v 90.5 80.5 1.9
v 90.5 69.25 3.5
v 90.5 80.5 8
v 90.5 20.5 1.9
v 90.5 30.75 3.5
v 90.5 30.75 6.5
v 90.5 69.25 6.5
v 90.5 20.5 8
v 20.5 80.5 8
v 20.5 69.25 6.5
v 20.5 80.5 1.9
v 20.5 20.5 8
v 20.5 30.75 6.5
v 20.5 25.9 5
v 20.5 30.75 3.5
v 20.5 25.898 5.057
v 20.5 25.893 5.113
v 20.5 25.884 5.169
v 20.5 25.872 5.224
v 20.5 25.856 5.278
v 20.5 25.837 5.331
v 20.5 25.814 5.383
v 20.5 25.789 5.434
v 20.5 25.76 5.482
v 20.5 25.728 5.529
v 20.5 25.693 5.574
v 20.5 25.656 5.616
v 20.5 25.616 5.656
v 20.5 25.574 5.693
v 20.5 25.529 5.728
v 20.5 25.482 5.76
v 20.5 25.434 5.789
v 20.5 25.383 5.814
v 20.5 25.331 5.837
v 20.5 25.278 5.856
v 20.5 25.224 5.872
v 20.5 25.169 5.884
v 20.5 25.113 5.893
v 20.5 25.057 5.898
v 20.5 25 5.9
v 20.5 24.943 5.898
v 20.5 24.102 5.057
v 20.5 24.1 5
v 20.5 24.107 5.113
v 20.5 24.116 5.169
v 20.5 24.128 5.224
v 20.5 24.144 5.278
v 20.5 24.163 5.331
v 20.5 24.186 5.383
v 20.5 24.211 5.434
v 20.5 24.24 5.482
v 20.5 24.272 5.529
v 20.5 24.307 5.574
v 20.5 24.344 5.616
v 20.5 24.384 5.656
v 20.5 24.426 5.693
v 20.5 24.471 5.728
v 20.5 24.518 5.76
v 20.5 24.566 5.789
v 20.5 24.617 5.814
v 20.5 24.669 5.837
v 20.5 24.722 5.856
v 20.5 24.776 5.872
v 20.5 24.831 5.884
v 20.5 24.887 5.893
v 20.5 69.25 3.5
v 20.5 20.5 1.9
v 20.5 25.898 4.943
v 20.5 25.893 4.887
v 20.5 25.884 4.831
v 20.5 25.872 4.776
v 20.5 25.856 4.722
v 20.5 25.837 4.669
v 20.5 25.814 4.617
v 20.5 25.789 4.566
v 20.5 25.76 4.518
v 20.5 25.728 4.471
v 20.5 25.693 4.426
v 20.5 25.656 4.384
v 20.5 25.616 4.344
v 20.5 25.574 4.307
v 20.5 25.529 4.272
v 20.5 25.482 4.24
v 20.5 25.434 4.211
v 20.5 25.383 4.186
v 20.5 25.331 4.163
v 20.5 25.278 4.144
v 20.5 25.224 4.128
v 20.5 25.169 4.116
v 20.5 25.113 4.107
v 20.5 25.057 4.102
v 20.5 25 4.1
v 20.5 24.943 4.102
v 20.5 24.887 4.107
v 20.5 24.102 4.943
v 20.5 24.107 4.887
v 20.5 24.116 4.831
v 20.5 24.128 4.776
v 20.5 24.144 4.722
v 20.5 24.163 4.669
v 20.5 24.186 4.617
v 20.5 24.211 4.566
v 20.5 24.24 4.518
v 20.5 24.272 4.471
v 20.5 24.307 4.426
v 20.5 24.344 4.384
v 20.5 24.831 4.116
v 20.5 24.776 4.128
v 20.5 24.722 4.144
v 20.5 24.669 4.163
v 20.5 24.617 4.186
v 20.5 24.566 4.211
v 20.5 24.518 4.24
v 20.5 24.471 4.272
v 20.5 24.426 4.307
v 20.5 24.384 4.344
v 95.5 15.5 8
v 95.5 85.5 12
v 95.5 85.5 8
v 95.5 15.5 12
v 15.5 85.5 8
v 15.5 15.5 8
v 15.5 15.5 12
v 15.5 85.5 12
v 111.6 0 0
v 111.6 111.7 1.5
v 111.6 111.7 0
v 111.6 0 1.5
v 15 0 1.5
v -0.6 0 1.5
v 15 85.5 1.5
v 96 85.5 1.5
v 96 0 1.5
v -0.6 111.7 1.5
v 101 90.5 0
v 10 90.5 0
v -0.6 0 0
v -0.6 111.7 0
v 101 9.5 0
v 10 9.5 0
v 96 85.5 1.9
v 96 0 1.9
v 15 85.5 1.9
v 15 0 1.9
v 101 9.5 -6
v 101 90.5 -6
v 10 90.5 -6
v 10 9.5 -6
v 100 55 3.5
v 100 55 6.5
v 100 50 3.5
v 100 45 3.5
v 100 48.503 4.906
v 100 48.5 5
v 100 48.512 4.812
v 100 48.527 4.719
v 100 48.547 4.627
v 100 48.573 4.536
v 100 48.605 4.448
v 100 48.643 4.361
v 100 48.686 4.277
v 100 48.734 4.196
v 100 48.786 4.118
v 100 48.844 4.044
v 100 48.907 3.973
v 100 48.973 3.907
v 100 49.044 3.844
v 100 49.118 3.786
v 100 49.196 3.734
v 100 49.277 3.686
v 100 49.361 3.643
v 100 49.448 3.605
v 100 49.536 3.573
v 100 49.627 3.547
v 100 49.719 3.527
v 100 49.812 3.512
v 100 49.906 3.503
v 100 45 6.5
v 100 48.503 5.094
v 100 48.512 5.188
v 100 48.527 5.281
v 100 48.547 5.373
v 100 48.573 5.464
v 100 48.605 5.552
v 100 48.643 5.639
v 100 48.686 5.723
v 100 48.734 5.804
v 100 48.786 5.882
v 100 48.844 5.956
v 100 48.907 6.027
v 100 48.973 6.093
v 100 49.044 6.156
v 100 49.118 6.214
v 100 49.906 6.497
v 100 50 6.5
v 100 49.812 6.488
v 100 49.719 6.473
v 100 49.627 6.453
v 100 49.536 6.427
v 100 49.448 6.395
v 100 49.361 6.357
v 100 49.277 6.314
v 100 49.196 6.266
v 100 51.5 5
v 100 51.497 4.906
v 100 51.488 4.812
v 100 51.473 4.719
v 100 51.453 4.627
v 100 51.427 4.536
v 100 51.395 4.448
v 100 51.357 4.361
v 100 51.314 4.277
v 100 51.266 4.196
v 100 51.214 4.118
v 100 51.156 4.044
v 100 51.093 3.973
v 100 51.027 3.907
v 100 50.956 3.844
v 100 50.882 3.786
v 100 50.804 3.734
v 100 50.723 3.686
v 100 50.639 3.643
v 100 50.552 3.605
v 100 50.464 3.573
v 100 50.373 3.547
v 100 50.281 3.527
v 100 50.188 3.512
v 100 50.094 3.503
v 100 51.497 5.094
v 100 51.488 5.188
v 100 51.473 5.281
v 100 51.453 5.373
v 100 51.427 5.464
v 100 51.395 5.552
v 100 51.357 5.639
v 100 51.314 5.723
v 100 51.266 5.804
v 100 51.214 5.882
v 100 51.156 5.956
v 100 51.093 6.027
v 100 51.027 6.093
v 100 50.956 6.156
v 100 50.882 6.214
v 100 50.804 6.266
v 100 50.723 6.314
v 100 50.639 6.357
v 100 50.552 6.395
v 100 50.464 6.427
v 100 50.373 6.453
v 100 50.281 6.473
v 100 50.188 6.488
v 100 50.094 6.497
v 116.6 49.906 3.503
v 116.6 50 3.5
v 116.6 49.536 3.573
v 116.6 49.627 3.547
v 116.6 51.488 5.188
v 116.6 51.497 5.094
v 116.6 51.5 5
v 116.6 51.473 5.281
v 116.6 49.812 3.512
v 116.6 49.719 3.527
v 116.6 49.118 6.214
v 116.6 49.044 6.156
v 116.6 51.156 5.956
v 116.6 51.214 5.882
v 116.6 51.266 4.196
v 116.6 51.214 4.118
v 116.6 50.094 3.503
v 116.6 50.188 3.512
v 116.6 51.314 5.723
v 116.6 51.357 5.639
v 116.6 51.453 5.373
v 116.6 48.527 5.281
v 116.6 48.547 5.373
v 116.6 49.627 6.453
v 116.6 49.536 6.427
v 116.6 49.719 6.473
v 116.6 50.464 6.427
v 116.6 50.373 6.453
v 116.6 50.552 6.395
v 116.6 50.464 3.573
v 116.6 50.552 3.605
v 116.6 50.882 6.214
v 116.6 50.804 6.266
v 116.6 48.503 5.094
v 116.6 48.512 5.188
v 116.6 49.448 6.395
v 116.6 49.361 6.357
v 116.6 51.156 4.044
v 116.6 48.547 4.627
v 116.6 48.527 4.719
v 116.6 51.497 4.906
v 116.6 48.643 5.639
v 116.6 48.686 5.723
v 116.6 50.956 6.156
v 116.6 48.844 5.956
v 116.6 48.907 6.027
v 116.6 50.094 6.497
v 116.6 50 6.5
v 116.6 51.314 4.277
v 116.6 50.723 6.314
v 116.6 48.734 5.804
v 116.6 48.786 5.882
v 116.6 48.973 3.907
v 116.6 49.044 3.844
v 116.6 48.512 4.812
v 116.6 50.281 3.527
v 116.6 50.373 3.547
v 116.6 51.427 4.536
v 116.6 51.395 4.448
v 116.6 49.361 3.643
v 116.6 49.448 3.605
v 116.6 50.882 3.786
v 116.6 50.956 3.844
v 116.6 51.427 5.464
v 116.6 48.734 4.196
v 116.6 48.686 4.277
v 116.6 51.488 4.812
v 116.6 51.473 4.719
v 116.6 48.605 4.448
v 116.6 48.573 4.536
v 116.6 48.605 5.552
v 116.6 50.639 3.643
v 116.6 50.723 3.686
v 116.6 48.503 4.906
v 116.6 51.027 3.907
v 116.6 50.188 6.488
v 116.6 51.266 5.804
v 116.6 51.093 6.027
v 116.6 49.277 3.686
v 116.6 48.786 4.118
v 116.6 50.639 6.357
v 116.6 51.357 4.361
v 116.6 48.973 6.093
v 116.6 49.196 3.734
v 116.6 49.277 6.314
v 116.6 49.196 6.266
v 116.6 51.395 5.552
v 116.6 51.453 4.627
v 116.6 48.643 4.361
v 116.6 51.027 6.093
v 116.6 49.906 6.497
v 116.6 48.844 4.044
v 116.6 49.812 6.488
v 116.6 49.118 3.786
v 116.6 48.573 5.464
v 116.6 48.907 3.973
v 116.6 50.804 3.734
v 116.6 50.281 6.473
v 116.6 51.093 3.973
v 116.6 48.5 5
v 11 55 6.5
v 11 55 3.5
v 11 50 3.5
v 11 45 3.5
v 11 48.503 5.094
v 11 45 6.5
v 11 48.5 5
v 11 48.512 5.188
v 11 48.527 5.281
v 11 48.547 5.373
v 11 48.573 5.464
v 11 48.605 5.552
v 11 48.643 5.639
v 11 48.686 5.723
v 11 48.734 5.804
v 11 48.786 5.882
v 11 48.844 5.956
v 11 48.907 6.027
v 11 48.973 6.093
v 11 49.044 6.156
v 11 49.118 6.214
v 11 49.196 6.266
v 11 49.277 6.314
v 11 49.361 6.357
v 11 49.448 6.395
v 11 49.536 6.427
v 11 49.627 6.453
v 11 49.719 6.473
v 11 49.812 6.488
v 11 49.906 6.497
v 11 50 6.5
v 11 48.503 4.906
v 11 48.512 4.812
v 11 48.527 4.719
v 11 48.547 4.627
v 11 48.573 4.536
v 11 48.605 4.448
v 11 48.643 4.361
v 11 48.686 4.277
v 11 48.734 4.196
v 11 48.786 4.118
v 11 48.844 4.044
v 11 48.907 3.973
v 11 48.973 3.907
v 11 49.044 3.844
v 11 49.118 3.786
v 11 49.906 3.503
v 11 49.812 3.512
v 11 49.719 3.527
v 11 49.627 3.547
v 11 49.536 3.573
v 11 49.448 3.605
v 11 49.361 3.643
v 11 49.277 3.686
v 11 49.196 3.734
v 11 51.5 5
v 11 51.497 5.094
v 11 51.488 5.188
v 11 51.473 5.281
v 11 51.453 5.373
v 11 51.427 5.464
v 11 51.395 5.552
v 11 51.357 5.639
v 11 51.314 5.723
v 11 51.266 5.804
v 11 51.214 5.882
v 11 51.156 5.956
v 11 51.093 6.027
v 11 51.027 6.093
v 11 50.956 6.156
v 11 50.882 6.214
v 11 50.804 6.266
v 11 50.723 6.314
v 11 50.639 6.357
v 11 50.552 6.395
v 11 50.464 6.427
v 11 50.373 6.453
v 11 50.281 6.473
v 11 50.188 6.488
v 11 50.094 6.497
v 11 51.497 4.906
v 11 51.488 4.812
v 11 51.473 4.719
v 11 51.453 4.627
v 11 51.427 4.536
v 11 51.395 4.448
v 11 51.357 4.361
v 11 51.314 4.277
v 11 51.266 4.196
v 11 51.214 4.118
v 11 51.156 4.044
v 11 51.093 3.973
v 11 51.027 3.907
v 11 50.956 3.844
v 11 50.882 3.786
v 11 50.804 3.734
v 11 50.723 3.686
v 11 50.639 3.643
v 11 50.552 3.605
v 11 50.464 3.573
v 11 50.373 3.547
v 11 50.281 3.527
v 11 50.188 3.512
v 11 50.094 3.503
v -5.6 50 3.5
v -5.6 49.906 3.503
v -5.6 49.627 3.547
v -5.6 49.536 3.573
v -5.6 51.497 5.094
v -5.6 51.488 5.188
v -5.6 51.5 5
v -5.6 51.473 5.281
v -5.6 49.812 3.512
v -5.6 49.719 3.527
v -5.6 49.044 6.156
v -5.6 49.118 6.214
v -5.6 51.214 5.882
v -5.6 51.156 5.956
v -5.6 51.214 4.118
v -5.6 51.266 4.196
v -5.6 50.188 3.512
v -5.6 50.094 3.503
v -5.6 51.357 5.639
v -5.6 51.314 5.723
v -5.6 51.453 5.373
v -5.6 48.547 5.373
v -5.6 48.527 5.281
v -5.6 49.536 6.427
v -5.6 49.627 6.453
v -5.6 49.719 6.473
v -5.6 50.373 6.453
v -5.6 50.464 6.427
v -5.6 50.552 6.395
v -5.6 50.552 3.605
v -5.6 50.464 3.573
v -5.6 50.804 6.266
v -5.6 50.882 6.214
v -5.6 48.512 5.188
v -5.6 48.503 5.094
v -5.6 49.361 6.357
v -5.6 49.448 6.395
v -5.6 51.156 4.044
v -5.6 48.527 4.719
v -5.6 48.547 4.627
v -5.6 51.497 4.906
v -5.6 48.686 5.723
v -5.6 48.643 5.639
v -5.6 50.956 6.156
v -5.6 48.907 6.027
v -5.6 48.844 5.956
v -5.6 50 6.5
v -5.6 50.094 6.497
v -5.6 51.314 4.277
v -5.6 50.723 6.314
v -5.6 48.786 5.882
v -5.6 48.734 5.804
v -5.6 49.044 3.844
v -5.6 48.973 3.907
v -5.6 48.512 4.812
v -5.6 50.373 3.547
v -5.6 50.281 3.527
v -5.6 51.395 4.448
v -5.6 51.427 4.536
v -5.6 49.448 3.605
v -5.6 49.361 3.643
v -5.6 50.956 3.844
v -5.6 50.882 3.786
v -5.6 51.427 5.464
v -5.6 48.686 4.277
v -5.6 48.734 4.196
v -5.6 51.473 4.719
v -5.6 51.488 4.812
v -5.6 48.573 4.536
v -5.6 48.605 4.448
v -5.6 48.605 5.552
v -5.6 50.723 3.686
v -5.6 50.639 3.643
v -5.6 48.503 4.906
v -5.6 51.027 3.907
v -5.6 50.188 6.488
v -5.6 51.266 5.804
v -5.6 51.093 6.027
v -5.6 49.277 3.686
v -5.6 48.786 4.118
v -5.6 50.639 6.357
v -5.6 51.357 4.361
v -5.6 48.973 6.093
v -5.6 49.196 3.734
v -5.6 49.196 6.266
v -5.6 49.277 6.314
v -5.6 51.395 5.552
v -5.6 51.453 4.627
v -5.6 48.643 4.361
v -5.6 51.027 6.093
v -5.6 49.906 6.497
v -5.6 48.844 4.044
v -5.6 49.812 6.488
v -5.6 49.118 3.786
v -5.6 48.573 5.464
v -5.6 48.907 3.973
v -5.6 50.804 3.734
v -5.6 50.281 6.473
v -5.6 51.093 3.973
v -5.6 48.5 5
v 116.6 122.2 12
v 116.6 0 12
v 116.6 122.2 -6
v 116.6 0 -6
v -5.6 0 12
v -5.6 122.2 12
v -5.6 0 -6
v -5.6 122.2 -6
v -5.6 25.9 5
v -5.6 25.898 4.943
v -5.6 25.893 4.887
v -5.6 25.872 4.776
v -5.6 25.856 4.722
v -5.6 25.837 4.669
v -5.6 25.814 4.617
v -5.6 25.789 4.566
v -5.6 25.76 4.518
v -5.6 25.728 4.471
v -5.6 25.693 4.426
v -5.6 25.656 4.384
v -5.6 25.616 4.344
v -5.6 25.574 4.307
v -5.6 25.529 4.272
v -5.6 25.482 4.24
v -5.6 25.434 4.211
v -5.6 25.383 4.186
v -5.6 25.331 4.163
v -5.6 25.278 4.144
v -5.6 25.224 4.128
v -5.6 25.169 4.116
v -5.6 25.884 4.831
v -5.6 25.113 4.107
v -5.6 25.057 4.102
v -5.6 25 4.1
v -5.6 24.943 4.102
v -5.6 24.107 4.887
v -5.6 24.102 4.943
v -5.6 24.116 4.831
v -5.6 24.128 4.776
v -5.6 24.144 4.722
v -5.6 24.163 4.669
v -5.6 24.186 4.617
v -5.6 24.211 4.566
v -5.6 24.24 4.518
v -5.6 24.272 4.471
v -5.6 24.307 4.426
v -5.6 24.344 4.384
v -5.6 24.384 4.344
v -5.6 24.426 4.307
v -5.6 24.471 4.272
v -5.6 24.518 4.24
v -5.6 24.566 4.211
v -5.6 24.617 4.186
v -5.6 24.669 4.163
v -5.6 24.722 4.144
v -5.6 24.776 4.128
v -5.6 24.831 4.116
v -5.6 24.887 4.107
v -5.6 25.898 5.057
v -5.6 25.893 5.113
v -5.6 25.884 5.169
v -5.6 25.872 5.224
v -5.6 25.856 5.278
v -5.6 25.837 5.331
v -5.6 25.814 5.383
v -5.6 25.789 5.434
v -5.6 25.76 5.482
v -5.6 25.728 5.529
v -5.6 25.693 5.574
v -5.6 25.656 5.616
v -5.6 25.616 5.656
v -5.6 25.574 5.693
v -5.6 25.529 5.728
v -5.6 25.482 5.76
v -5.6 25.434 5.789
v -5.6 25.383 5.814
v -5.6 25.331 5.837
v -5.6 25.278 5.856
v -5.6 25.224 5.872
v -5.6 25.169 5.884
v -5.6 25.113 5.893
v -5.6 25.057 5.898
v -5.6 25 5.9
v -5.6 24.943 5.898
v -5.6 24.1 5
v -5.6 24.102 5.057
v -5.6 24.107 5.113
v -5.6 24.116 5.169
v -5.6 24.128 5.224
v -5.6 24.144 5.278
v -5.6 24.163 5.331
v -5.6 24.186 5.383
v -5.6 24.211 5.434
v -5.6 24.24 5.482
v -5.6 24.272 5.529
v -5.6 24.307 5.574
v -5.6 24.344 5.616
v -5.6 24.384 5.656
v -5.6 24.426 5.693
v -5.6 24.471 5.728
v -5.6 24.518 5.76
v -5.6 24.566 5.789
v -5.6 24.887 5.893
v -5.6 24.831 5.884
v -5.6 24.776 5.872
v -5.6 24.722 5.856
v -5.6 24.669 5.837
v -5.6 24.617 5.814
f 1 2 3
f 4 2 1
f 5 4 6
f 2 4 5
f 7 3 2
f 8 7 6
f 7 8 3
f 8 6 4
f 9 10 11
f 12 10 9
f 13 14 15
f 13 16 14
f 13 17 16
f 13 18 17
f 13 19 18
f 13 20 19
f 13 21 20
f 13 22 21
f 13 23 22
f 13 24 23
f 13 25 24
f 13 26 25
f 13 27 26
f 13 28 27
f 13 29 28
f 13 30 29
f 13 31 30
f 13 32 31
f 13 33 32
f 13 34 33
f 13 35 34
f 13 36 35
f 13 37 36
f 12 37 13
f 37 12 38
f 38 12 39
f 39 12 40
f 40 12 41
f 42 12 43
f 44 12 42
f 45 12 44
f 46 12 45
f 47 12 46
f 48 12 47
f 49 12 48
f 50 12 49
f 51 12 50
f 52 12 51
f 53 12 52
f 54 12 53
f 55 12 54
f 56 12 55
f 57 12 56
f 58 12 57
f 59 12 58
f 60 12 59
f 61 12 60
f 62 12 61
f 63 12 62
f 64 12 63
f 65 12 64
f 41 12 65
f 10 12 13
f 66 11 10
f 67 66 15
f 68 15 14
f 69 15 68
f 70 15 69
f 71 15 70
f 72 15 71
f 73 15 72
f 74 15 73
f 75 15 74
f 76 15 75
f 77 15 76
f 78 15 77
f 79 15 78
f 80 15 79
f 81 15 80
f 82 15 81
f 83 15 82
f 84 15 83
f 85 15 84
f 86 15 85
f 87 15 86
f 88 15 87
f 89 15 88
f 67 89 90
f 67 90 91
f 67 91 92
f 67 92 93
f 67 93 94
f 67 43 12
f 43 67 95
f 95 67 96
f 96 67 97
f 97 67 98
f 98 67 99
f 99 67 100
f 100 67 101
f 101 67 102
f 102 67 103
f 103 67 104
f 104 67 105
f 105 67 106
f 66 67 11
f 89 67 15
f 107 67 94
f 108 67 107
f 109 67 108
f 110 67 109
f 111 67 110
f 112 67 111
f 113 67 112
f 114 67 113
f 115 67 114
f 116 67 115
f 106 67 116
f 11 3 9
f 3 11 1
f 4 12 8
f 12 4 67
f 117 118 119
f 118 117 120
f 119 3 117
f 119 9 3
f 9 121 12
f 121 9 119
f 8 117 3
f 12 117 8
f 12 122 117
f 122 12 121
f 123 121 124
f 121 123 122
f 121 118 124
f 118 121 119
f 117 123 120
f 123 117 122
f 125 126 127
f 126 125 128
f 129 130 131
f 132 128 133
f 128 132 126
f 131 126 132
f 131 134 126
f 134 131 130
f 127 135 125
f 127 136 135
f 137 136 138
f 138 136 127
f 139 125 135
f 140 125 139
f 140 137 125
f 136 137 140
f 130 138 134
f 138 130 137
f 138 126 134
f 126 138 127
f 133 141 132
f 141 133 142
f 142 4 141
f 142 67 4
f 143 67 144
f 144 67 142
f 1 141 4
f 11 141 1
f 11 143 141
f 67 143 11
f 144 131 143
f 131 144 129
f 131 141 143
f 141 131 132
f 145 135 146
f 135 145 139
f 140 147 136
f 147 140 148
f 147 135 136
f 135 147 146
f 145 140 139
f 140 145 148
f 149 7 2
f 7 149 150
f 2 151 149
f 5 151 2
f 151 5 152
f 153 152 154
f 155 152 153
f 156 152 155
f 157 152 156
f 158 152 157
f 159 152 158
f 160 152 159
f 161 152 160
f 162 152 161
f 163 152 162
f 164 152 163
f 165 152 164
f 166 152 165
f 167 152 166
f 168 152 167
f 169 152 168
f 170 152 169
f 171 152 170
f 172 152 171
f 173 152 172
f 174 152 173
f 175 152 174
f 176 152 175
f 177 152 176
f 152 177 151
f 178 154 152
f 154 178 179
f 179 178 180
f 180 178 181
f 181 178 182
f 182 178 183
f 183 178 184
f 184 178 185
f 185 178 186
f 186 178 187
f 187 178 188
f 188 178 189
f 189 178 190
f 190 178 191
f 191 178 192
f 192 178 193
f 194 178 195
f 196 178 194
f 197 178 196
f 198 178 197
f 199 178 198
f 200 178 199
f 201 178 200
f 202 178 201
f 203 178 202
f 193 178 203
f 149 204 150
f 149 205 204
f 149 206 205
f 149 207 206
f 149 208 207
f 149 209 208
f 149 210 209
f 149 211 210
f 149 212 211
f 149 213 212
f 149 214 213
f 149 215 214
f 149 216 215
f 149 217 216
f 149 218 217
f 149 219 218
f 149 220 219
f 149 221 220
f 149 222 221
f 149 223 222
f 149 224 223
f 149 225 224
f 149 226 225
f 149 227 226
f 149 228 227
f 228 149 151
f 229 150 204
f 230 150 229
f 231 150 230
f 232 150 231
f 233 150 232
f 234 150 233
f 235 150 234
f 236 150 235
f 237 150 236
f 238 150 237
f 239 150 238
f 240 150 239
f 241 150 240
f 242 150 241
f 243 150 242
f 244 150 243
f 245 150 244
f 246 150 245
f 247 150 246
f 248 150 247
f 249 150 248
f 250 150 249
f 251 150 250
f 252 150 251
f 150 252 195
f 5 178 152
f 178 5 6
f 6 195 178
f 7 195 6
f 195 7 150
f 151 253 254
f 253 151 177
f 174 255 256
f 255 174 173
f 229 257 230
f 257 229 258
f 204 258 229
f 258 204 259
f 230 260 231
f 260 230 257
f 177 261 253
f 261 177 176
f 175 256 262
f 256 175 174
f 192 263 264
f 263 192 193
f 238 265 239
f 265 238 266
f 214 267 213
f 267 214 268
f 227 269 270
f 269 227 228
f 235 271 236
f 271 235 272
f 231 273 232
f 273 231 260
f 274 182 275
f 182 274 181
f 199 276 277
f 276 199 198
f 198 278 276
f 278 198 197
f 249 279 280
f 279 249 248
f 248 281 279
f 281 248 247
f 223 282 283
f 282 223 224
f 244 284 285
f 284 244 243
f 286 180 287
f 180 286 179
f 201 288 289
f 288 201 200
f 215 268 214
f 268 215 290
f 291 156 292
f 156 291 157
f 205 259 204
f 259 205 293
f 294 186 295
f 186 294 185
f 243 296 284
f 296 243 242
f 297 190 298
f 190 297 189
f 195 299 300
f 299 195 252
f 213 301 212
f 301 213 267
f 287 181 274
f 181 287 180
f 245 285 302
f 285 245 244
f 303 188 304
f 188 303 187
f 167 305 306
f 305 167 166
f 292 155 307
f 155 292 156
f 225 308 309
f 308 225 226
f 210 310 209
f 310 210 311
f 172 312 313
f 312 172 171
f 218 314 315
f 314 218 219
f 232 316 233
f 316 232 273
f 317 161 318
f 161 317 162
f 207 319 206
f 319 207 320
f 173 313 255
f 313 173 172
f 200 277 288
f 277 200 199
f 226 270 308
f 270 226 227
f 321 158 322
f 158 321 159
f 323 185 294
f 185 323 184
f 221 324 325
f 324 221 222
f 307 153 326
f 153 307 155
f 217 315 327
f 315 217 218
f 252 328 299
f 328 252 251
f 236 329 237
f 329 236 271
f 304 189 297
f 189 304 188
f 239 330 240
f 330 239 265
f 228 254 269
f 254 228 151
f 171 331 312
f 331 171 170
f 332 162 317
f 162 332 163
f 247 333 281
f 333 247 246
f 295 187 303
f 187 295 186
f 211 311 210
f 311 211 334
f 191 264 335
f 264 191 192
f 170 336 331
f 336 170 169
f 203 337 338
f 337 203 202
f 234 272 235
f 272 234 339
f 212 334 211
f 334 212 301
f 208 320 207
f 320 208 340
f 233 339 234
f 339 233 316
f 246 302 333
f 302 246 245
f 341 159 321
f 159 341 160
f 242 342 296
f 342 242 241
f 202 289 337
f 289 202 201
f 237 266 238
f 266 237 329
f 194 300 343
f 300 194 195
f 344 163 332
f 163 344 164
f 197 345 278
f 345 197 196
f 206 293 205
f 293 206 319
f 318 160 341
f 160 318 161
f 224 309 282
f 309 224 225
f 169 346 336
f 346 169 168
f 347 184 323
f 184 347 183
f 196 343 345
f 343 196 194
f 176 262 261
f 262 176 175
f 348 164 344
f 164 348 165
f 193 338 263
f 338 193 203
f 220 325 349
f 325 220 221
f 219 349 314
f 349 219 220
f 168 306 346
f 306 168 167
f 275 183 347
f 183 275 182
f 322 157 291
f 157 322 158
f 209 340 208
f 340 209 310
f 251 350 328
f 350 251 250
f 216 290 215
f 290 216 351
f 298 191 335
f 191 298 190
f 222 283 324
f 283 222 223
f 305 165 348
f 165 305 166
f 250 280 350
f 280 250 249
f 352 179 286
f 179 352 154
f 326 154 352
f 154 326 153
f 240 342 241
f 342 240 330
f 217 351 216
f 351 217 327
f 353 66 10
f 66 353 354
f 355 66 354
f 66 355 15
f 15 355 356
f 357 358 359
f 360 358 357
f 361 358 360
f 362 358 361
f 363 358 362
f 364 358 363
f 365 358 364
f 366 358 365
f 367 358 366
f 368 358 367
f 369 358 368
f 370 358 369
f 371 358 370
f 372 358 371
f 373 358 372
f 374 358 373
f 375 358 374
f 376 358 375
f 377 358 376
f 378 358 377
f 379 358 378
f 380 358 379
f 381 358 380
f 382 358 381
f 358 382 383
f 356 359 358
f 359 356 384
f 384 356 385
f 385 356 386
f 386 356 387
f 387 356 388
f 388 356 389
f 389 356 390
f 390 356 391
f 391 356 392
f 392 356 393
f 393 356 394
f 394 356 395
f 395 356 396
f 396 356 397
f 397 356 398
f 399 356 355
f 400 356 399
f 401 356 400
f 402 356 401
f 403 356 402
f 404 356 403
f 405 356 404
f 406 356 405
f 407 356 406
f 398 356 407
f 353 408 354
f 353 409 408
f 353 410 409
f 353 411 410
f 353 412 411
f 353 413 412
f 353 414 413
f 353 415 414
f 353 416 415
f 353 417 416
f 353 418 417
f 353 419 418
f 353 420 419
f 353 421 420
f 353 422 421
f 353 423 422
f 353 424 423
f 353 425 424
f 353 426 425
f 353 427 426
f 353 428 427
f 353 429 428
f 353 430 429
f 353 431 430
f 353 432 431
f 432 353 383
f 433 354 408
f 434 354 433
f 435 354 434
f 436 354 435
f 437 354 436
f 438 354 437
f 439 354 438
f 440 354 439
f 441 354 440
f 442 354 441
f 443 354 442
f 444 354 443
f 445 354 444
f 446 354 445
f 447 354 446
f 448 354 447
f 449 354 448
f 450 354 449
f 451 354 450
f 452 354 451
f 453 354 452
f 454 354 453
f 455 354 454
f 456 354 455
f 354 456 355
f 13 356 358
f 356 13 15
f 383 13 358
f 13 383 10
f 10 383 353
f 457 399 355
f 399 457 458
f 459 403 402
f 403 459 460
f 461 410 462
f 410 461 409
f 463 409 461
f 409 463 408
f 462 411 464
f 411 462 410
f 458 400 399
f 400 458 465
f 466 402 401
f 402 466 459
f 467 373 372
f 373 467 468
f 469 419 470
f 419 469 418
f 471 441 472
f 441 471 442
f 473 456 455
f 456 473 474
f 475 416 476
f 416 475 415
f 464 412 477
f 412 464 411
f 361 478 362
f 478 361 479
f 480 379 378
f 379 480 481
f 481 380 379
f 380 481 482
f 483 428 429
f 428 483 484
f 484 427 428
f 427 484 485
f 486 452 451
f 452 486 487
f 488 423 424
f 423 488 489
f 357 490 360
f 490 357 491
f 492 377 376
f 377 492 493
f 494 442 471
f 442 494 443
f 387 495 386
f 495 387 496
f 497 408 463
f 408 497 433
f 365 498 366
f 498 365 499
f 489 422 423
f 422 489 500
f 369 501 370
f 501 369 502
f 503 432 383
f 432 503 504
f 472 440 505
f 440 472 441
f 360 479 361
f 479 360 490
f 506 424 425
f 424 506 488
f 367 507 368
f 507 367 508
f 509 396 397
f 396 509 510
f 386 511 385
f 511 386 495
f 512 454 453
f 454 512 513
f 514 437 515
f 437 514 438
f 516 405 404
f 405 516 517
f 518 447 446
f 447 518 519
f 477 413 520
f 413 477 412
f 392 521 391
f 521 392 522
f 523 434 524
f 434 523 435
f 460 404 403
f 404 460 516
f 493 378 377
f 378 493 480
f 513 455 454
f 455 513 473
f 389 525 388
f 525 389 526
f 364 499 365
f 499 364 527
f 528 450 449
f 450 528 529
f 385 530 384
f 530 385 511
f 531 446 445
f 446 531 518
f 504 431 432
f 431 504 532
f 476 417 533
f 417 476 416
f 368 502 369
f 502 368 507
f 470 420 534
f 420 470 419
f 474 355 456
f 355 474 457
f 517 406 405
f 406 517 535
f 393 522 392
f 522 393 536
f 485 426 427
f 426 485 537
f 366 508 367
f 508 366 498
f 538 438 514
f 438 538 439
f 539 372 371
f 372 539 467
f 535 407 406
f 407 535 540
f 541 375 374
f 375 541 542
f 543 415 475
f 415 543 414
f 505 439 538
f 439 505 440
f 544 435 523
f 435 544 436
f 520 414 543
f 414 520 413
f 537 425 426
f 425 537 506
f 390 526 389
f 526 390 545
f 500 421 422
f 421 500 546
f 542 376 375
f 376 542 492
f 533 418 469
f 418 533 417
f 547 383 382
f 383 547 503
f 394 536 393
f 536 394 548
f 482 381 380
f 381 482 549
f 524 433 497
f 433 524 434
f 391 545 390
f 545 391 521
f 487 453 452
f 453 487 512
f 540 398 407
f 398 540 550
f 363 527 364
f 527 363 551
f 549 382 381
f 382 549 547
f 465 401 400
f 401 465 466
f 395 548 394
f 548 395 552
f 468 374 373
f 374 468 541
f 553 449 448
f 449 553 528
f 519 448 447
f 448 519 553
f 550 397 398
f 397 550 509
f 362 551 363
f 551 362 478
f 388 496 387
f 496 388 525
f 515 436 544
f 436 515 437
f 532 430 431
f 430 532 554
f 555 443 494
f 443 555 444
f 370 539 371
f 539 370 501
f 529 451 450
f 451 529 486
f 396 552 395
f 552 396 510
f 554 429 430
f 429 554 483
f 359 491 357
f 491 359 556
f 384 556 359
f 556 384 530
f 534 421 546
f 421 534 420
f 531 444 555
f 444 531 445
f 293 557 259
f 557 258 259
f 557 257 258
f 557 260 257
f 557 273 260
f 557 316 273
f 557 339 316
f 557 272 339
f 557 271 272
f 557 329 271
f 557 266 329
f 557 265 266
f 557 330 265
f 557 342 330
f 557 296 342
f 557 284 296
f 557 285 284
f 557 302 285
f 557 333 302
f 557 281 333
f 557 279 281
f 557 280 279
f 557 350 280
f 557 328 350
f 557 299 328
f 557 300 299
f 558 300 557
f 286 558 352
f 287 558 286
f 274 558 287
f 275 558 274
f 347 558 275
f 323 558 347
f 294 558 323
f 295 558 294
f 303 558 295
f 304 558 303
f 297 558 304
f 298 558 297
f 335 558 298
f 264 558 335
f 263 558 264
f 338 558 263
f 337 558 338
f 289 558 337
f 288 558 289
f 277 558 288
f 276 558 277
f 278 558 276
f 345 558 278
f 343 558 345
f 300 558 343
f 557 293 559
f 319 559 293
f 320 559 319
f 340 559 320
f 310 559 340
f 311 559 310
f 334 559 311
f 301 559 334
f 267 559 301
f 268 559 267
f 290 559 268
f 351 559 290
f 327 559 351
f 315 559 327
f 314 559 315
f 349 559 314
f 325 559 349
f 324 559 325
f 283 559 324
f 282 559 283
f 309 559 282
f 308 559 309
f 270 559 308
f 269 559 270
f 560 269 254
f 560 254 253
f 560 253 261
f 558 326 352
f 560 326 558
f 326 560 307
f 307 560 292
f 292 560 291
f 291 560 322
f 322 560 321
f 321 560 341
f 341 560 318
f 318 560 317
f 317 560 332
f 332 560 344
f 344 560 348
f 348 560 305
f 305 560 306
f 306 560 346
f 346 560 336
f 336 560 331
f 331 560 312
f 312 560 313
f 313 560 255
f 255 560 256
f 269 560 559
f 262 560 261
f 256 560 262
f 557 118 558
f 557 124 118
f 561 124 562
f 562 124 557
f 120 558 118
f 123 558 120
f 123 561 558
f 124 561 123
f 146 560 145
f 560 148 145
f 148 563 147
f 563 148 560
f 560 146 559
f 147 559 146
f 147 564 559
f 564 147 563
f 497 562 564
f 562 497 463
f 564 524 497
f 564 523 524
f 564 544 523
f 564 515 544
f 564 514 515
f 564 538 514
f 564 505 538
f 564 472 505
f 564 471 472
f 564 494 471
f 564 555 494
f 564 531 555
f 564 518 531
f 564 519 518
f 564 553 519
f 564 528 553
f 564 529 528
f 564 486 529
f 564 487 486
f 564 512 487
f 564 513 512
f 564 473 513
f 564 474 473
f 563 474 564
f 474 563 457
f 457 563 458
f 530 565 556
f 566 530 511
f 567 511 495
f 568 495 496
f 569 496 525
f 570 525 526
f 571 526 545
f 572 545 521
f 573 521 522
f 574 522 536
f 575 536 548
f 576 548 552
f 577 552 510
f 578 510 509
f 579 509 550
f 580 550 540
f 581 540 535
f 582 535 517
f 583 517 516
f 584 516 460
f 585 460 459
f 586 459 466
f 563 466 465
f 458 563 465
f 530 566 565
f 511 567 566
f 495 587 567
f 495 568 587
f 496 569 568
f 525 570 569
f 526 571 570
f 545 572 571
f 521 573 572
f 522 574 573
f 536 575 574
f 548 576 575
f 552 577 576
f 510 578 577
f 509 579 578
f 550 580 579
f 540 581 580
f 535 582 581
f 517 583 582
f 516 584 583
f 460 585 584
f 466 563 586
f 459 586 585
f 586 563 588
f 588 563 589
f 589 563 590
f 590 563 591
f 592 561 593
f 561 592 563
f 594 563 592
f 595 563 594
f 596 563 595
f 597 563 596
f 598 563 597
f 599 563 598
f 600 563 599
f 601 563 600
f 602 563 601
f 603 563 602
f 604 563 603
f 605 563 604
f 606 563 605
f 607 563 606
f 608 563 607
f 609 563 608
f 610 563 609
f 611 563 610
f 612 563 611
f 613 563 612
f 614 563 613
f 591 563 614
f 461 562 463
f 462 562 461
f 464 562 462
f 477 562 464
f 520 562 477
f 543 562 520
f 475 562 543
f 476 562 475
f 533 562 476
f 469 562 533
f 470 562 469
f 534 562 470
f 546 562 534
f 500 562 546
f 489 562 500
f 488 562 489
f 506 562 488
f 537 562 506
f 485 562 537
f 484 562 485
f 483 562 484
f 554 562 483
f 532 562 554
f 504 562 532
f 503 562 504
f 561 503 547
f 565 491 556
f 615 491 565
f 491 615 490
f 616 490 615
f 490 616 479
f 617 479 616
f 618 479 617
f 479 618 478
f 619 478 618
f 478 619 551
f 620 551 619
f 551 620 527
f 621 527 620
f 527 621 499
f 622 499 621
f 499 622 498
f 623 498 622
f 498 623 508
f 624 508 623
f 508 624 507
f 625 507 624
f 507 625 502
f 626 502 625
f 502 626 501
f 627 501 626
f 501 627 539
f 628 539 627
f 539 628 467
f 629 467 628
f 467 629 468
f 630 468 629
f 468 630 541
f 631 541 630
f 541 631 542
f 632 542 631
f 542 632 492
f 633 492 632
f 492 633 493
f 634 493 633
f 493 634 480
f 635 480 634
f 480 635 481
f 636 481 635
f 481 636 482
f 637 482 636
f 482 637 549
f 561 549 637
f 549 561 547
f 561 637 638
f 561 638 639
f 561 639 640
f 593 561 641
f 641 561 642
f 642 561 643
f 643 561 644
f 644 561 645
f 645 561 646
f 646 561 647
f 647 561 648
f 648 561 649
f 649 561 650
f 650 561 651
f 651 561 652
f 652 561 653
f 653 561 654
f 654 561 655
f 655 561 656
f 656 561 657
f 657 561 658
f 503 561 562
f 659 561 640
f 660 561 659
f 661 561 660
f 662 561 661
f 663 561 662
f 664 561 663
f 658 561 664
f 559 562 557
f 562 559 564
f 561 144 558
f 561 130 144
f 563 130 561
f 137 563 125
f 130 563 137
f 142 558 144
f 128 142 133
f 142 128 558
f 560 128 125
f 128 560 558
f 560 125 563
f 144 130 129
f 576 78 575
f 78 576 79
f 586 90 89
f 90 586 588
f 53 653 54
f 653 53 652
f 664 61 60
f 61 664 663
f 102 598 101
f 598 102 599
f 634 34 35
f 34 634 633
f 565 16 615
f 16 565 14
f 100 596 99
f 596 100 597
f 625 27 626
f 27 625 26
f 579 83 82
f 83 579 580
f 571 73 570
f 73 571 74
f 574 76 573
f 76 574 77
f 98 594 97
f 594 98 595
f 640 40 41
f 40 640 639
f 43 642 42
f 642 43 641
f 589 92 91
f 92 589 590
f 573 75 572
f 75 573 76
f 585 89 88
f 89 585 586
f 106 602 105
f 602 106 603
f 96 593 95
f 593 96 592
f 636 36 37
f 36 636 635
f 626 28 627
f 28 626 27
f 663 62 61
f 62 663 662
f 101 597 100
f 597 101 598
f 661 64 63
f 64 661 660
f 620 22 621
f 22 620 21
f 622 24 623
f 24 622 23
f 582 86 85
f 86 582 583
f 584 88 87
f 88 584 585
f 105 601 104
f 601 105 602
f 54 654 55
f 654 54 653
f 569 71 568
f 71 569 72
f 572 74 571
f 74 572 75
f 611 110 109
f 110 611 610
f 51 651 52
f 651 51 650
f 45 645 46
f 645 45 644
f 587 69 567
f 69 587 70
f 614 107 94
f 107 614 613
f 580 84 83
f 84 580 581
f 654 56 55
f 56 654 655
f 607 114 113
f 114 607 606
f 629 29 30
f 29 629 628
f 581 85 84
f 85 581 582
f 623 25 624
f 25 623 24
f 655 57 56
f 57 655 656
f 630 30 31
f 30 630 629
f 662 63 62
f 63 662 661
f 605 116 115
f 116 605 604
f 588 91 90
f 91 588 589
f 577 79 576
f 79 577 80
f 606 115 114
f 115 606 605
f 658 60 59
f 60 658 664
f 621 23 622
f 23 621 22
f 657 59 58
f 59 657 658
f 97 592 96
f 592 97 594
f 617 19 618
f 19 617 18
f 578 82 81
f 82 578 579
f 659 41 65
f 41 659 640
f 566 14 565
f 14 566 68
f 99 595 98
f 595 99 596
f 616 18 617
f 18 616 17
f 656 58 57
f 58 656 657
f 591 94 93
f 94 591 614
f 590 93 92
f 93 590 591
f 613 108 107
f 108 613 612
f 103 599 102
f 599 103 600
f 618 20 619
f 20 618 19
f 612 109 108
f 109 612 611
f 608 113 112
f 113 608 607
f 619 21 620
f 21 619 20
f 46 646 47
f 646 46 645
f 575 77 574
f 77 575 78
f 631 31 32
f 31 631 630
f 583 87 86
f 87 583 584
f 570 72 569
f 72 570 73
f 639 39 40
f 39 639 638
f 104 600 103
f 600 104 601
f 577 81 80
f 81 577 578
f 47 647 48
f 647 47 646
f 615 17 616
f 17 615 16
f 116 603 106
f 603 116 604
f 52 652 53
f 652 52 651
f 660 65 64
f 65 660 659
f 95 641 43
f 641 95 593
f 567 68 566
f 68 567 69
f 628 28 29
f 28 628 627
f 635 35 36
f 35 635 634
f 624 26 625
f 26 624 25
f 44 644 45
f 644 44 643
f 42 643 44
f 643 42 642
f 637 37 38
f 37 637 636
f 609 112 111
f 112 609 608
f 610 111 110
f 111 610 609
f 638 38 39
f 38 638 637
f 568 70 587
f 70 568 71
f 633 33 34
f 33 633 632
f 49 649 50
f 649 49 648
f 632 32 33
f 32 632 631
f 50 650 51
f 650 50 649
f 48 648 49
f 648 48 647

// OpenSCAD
module ceramic() {
    color("Gainsboro") cube([111,111,1.2]); 
}

module netbase() {
    color("SandyBrown") cube([80,90,0.4]); 
}

module cut() {
    color("SandyBrown") cube([40,25,3]); 
}

module net() {
    difference()
    {
        netbase();
        translate([-10,-5,-1]) cut();
        translate([50,-5,-1]) cut();
    }    
}

module gnd() {
    color("DarkKhaki") cube([90,80,6]);     
}

module visible() {
    color("Red") cube([70,70,10]); 
}

module innerFrame() {
    union()
    {        
        translate([15.5,-5,1.2]) net();        
        ceramic();
        translate([10.5,10,-6])gnd();
    }    
}

// object with tolerances
module ceramic1() {    
    color("Gainsboro") cube([112.2,112.2,1.5]); // y trnsl 0.5
}

module netbase1() {    
    color("SandyBrown") cube([81,91,0.5]); // y trnsl 0.5
}


module gnd1() {
    color("DarkKhaki") cube([91,81,6.4]); // y trnsl 0.5
}

module visible1() {
    union(){
        color("Red") cube([70,60,10]);
        translate([-5,-5,7])
        color("Red") cube([80,70,10]);
    }
}

module innerFrame1() {
    union()
    {
        translate([-0.6,-0.5,0]) ceramic1();
        translate([15,-5.5,1.4]) netbase1();        
        translate([10,9.5,-6.2])gnd1();
        translate([20.5,20.5,1])visible1();
    }    
}

module  hole(){
    translate([-10,0,5])
    rotate ([0,90,0])
    color("Red")
    cylinder (130,d=3, $fn=100);
}

module  tempHole(){
    translate([-10,0,5])
    rotate ([0,90,0])
    color("Red")
    cylinder (60,d=1.8, $fn=100);
}

module box() {
    translate([-5.6,0,-6])
    color("Red") cube([122.2,122.2,18]);    
}
module prism(l, w, h){
       polyhedron(
               points=[[0,0,0], [l,0,0], [l,w,0], [0,w,0], [3*l/8,0,h], [5*l/8,0,h],
    [5*l/8,w,h], [3*l/8,w,h]],
               faces=[[0,1,2,3], [4,7,6,5], [0,3,7,4], [2,6,7,3], [1,5,6,2], [0,4,5,1]]
               );
       }
 
     

       
 module  cavHole(l, w, h){
    translate([l/2,w/2,h/10])    
    color("Red")
    cylinder (3*h,d=3, $fn=100);
}
       
module cavity(l,w,h){
    rotate([90,0,90])
    union(){
        prism(l, w, h);
        cavHole(l,w,h);        
        } 
    }
    
l = 40;
w = 3;
h = 10;

module objectBox() {
    difference()
    {
        box();
        innerFrame1();
        translate([0,25,0]) tempHole();
        
        //cavities

        translate([90,30,3.5]) cavity(l, w, h);        
        translate([21,30,3.5])
        mirror([1,0,0]) cavity(l, w, h);
        
        //holes
    /*    
        translate([0,35,0]) hole();
        translate([0,50,0]) hole();
        translate([0,65,0]) hole();
      */  
    }
}

objectBox(); 
//innerFrame();
//translate([20.5,20.5,1])visible1();
